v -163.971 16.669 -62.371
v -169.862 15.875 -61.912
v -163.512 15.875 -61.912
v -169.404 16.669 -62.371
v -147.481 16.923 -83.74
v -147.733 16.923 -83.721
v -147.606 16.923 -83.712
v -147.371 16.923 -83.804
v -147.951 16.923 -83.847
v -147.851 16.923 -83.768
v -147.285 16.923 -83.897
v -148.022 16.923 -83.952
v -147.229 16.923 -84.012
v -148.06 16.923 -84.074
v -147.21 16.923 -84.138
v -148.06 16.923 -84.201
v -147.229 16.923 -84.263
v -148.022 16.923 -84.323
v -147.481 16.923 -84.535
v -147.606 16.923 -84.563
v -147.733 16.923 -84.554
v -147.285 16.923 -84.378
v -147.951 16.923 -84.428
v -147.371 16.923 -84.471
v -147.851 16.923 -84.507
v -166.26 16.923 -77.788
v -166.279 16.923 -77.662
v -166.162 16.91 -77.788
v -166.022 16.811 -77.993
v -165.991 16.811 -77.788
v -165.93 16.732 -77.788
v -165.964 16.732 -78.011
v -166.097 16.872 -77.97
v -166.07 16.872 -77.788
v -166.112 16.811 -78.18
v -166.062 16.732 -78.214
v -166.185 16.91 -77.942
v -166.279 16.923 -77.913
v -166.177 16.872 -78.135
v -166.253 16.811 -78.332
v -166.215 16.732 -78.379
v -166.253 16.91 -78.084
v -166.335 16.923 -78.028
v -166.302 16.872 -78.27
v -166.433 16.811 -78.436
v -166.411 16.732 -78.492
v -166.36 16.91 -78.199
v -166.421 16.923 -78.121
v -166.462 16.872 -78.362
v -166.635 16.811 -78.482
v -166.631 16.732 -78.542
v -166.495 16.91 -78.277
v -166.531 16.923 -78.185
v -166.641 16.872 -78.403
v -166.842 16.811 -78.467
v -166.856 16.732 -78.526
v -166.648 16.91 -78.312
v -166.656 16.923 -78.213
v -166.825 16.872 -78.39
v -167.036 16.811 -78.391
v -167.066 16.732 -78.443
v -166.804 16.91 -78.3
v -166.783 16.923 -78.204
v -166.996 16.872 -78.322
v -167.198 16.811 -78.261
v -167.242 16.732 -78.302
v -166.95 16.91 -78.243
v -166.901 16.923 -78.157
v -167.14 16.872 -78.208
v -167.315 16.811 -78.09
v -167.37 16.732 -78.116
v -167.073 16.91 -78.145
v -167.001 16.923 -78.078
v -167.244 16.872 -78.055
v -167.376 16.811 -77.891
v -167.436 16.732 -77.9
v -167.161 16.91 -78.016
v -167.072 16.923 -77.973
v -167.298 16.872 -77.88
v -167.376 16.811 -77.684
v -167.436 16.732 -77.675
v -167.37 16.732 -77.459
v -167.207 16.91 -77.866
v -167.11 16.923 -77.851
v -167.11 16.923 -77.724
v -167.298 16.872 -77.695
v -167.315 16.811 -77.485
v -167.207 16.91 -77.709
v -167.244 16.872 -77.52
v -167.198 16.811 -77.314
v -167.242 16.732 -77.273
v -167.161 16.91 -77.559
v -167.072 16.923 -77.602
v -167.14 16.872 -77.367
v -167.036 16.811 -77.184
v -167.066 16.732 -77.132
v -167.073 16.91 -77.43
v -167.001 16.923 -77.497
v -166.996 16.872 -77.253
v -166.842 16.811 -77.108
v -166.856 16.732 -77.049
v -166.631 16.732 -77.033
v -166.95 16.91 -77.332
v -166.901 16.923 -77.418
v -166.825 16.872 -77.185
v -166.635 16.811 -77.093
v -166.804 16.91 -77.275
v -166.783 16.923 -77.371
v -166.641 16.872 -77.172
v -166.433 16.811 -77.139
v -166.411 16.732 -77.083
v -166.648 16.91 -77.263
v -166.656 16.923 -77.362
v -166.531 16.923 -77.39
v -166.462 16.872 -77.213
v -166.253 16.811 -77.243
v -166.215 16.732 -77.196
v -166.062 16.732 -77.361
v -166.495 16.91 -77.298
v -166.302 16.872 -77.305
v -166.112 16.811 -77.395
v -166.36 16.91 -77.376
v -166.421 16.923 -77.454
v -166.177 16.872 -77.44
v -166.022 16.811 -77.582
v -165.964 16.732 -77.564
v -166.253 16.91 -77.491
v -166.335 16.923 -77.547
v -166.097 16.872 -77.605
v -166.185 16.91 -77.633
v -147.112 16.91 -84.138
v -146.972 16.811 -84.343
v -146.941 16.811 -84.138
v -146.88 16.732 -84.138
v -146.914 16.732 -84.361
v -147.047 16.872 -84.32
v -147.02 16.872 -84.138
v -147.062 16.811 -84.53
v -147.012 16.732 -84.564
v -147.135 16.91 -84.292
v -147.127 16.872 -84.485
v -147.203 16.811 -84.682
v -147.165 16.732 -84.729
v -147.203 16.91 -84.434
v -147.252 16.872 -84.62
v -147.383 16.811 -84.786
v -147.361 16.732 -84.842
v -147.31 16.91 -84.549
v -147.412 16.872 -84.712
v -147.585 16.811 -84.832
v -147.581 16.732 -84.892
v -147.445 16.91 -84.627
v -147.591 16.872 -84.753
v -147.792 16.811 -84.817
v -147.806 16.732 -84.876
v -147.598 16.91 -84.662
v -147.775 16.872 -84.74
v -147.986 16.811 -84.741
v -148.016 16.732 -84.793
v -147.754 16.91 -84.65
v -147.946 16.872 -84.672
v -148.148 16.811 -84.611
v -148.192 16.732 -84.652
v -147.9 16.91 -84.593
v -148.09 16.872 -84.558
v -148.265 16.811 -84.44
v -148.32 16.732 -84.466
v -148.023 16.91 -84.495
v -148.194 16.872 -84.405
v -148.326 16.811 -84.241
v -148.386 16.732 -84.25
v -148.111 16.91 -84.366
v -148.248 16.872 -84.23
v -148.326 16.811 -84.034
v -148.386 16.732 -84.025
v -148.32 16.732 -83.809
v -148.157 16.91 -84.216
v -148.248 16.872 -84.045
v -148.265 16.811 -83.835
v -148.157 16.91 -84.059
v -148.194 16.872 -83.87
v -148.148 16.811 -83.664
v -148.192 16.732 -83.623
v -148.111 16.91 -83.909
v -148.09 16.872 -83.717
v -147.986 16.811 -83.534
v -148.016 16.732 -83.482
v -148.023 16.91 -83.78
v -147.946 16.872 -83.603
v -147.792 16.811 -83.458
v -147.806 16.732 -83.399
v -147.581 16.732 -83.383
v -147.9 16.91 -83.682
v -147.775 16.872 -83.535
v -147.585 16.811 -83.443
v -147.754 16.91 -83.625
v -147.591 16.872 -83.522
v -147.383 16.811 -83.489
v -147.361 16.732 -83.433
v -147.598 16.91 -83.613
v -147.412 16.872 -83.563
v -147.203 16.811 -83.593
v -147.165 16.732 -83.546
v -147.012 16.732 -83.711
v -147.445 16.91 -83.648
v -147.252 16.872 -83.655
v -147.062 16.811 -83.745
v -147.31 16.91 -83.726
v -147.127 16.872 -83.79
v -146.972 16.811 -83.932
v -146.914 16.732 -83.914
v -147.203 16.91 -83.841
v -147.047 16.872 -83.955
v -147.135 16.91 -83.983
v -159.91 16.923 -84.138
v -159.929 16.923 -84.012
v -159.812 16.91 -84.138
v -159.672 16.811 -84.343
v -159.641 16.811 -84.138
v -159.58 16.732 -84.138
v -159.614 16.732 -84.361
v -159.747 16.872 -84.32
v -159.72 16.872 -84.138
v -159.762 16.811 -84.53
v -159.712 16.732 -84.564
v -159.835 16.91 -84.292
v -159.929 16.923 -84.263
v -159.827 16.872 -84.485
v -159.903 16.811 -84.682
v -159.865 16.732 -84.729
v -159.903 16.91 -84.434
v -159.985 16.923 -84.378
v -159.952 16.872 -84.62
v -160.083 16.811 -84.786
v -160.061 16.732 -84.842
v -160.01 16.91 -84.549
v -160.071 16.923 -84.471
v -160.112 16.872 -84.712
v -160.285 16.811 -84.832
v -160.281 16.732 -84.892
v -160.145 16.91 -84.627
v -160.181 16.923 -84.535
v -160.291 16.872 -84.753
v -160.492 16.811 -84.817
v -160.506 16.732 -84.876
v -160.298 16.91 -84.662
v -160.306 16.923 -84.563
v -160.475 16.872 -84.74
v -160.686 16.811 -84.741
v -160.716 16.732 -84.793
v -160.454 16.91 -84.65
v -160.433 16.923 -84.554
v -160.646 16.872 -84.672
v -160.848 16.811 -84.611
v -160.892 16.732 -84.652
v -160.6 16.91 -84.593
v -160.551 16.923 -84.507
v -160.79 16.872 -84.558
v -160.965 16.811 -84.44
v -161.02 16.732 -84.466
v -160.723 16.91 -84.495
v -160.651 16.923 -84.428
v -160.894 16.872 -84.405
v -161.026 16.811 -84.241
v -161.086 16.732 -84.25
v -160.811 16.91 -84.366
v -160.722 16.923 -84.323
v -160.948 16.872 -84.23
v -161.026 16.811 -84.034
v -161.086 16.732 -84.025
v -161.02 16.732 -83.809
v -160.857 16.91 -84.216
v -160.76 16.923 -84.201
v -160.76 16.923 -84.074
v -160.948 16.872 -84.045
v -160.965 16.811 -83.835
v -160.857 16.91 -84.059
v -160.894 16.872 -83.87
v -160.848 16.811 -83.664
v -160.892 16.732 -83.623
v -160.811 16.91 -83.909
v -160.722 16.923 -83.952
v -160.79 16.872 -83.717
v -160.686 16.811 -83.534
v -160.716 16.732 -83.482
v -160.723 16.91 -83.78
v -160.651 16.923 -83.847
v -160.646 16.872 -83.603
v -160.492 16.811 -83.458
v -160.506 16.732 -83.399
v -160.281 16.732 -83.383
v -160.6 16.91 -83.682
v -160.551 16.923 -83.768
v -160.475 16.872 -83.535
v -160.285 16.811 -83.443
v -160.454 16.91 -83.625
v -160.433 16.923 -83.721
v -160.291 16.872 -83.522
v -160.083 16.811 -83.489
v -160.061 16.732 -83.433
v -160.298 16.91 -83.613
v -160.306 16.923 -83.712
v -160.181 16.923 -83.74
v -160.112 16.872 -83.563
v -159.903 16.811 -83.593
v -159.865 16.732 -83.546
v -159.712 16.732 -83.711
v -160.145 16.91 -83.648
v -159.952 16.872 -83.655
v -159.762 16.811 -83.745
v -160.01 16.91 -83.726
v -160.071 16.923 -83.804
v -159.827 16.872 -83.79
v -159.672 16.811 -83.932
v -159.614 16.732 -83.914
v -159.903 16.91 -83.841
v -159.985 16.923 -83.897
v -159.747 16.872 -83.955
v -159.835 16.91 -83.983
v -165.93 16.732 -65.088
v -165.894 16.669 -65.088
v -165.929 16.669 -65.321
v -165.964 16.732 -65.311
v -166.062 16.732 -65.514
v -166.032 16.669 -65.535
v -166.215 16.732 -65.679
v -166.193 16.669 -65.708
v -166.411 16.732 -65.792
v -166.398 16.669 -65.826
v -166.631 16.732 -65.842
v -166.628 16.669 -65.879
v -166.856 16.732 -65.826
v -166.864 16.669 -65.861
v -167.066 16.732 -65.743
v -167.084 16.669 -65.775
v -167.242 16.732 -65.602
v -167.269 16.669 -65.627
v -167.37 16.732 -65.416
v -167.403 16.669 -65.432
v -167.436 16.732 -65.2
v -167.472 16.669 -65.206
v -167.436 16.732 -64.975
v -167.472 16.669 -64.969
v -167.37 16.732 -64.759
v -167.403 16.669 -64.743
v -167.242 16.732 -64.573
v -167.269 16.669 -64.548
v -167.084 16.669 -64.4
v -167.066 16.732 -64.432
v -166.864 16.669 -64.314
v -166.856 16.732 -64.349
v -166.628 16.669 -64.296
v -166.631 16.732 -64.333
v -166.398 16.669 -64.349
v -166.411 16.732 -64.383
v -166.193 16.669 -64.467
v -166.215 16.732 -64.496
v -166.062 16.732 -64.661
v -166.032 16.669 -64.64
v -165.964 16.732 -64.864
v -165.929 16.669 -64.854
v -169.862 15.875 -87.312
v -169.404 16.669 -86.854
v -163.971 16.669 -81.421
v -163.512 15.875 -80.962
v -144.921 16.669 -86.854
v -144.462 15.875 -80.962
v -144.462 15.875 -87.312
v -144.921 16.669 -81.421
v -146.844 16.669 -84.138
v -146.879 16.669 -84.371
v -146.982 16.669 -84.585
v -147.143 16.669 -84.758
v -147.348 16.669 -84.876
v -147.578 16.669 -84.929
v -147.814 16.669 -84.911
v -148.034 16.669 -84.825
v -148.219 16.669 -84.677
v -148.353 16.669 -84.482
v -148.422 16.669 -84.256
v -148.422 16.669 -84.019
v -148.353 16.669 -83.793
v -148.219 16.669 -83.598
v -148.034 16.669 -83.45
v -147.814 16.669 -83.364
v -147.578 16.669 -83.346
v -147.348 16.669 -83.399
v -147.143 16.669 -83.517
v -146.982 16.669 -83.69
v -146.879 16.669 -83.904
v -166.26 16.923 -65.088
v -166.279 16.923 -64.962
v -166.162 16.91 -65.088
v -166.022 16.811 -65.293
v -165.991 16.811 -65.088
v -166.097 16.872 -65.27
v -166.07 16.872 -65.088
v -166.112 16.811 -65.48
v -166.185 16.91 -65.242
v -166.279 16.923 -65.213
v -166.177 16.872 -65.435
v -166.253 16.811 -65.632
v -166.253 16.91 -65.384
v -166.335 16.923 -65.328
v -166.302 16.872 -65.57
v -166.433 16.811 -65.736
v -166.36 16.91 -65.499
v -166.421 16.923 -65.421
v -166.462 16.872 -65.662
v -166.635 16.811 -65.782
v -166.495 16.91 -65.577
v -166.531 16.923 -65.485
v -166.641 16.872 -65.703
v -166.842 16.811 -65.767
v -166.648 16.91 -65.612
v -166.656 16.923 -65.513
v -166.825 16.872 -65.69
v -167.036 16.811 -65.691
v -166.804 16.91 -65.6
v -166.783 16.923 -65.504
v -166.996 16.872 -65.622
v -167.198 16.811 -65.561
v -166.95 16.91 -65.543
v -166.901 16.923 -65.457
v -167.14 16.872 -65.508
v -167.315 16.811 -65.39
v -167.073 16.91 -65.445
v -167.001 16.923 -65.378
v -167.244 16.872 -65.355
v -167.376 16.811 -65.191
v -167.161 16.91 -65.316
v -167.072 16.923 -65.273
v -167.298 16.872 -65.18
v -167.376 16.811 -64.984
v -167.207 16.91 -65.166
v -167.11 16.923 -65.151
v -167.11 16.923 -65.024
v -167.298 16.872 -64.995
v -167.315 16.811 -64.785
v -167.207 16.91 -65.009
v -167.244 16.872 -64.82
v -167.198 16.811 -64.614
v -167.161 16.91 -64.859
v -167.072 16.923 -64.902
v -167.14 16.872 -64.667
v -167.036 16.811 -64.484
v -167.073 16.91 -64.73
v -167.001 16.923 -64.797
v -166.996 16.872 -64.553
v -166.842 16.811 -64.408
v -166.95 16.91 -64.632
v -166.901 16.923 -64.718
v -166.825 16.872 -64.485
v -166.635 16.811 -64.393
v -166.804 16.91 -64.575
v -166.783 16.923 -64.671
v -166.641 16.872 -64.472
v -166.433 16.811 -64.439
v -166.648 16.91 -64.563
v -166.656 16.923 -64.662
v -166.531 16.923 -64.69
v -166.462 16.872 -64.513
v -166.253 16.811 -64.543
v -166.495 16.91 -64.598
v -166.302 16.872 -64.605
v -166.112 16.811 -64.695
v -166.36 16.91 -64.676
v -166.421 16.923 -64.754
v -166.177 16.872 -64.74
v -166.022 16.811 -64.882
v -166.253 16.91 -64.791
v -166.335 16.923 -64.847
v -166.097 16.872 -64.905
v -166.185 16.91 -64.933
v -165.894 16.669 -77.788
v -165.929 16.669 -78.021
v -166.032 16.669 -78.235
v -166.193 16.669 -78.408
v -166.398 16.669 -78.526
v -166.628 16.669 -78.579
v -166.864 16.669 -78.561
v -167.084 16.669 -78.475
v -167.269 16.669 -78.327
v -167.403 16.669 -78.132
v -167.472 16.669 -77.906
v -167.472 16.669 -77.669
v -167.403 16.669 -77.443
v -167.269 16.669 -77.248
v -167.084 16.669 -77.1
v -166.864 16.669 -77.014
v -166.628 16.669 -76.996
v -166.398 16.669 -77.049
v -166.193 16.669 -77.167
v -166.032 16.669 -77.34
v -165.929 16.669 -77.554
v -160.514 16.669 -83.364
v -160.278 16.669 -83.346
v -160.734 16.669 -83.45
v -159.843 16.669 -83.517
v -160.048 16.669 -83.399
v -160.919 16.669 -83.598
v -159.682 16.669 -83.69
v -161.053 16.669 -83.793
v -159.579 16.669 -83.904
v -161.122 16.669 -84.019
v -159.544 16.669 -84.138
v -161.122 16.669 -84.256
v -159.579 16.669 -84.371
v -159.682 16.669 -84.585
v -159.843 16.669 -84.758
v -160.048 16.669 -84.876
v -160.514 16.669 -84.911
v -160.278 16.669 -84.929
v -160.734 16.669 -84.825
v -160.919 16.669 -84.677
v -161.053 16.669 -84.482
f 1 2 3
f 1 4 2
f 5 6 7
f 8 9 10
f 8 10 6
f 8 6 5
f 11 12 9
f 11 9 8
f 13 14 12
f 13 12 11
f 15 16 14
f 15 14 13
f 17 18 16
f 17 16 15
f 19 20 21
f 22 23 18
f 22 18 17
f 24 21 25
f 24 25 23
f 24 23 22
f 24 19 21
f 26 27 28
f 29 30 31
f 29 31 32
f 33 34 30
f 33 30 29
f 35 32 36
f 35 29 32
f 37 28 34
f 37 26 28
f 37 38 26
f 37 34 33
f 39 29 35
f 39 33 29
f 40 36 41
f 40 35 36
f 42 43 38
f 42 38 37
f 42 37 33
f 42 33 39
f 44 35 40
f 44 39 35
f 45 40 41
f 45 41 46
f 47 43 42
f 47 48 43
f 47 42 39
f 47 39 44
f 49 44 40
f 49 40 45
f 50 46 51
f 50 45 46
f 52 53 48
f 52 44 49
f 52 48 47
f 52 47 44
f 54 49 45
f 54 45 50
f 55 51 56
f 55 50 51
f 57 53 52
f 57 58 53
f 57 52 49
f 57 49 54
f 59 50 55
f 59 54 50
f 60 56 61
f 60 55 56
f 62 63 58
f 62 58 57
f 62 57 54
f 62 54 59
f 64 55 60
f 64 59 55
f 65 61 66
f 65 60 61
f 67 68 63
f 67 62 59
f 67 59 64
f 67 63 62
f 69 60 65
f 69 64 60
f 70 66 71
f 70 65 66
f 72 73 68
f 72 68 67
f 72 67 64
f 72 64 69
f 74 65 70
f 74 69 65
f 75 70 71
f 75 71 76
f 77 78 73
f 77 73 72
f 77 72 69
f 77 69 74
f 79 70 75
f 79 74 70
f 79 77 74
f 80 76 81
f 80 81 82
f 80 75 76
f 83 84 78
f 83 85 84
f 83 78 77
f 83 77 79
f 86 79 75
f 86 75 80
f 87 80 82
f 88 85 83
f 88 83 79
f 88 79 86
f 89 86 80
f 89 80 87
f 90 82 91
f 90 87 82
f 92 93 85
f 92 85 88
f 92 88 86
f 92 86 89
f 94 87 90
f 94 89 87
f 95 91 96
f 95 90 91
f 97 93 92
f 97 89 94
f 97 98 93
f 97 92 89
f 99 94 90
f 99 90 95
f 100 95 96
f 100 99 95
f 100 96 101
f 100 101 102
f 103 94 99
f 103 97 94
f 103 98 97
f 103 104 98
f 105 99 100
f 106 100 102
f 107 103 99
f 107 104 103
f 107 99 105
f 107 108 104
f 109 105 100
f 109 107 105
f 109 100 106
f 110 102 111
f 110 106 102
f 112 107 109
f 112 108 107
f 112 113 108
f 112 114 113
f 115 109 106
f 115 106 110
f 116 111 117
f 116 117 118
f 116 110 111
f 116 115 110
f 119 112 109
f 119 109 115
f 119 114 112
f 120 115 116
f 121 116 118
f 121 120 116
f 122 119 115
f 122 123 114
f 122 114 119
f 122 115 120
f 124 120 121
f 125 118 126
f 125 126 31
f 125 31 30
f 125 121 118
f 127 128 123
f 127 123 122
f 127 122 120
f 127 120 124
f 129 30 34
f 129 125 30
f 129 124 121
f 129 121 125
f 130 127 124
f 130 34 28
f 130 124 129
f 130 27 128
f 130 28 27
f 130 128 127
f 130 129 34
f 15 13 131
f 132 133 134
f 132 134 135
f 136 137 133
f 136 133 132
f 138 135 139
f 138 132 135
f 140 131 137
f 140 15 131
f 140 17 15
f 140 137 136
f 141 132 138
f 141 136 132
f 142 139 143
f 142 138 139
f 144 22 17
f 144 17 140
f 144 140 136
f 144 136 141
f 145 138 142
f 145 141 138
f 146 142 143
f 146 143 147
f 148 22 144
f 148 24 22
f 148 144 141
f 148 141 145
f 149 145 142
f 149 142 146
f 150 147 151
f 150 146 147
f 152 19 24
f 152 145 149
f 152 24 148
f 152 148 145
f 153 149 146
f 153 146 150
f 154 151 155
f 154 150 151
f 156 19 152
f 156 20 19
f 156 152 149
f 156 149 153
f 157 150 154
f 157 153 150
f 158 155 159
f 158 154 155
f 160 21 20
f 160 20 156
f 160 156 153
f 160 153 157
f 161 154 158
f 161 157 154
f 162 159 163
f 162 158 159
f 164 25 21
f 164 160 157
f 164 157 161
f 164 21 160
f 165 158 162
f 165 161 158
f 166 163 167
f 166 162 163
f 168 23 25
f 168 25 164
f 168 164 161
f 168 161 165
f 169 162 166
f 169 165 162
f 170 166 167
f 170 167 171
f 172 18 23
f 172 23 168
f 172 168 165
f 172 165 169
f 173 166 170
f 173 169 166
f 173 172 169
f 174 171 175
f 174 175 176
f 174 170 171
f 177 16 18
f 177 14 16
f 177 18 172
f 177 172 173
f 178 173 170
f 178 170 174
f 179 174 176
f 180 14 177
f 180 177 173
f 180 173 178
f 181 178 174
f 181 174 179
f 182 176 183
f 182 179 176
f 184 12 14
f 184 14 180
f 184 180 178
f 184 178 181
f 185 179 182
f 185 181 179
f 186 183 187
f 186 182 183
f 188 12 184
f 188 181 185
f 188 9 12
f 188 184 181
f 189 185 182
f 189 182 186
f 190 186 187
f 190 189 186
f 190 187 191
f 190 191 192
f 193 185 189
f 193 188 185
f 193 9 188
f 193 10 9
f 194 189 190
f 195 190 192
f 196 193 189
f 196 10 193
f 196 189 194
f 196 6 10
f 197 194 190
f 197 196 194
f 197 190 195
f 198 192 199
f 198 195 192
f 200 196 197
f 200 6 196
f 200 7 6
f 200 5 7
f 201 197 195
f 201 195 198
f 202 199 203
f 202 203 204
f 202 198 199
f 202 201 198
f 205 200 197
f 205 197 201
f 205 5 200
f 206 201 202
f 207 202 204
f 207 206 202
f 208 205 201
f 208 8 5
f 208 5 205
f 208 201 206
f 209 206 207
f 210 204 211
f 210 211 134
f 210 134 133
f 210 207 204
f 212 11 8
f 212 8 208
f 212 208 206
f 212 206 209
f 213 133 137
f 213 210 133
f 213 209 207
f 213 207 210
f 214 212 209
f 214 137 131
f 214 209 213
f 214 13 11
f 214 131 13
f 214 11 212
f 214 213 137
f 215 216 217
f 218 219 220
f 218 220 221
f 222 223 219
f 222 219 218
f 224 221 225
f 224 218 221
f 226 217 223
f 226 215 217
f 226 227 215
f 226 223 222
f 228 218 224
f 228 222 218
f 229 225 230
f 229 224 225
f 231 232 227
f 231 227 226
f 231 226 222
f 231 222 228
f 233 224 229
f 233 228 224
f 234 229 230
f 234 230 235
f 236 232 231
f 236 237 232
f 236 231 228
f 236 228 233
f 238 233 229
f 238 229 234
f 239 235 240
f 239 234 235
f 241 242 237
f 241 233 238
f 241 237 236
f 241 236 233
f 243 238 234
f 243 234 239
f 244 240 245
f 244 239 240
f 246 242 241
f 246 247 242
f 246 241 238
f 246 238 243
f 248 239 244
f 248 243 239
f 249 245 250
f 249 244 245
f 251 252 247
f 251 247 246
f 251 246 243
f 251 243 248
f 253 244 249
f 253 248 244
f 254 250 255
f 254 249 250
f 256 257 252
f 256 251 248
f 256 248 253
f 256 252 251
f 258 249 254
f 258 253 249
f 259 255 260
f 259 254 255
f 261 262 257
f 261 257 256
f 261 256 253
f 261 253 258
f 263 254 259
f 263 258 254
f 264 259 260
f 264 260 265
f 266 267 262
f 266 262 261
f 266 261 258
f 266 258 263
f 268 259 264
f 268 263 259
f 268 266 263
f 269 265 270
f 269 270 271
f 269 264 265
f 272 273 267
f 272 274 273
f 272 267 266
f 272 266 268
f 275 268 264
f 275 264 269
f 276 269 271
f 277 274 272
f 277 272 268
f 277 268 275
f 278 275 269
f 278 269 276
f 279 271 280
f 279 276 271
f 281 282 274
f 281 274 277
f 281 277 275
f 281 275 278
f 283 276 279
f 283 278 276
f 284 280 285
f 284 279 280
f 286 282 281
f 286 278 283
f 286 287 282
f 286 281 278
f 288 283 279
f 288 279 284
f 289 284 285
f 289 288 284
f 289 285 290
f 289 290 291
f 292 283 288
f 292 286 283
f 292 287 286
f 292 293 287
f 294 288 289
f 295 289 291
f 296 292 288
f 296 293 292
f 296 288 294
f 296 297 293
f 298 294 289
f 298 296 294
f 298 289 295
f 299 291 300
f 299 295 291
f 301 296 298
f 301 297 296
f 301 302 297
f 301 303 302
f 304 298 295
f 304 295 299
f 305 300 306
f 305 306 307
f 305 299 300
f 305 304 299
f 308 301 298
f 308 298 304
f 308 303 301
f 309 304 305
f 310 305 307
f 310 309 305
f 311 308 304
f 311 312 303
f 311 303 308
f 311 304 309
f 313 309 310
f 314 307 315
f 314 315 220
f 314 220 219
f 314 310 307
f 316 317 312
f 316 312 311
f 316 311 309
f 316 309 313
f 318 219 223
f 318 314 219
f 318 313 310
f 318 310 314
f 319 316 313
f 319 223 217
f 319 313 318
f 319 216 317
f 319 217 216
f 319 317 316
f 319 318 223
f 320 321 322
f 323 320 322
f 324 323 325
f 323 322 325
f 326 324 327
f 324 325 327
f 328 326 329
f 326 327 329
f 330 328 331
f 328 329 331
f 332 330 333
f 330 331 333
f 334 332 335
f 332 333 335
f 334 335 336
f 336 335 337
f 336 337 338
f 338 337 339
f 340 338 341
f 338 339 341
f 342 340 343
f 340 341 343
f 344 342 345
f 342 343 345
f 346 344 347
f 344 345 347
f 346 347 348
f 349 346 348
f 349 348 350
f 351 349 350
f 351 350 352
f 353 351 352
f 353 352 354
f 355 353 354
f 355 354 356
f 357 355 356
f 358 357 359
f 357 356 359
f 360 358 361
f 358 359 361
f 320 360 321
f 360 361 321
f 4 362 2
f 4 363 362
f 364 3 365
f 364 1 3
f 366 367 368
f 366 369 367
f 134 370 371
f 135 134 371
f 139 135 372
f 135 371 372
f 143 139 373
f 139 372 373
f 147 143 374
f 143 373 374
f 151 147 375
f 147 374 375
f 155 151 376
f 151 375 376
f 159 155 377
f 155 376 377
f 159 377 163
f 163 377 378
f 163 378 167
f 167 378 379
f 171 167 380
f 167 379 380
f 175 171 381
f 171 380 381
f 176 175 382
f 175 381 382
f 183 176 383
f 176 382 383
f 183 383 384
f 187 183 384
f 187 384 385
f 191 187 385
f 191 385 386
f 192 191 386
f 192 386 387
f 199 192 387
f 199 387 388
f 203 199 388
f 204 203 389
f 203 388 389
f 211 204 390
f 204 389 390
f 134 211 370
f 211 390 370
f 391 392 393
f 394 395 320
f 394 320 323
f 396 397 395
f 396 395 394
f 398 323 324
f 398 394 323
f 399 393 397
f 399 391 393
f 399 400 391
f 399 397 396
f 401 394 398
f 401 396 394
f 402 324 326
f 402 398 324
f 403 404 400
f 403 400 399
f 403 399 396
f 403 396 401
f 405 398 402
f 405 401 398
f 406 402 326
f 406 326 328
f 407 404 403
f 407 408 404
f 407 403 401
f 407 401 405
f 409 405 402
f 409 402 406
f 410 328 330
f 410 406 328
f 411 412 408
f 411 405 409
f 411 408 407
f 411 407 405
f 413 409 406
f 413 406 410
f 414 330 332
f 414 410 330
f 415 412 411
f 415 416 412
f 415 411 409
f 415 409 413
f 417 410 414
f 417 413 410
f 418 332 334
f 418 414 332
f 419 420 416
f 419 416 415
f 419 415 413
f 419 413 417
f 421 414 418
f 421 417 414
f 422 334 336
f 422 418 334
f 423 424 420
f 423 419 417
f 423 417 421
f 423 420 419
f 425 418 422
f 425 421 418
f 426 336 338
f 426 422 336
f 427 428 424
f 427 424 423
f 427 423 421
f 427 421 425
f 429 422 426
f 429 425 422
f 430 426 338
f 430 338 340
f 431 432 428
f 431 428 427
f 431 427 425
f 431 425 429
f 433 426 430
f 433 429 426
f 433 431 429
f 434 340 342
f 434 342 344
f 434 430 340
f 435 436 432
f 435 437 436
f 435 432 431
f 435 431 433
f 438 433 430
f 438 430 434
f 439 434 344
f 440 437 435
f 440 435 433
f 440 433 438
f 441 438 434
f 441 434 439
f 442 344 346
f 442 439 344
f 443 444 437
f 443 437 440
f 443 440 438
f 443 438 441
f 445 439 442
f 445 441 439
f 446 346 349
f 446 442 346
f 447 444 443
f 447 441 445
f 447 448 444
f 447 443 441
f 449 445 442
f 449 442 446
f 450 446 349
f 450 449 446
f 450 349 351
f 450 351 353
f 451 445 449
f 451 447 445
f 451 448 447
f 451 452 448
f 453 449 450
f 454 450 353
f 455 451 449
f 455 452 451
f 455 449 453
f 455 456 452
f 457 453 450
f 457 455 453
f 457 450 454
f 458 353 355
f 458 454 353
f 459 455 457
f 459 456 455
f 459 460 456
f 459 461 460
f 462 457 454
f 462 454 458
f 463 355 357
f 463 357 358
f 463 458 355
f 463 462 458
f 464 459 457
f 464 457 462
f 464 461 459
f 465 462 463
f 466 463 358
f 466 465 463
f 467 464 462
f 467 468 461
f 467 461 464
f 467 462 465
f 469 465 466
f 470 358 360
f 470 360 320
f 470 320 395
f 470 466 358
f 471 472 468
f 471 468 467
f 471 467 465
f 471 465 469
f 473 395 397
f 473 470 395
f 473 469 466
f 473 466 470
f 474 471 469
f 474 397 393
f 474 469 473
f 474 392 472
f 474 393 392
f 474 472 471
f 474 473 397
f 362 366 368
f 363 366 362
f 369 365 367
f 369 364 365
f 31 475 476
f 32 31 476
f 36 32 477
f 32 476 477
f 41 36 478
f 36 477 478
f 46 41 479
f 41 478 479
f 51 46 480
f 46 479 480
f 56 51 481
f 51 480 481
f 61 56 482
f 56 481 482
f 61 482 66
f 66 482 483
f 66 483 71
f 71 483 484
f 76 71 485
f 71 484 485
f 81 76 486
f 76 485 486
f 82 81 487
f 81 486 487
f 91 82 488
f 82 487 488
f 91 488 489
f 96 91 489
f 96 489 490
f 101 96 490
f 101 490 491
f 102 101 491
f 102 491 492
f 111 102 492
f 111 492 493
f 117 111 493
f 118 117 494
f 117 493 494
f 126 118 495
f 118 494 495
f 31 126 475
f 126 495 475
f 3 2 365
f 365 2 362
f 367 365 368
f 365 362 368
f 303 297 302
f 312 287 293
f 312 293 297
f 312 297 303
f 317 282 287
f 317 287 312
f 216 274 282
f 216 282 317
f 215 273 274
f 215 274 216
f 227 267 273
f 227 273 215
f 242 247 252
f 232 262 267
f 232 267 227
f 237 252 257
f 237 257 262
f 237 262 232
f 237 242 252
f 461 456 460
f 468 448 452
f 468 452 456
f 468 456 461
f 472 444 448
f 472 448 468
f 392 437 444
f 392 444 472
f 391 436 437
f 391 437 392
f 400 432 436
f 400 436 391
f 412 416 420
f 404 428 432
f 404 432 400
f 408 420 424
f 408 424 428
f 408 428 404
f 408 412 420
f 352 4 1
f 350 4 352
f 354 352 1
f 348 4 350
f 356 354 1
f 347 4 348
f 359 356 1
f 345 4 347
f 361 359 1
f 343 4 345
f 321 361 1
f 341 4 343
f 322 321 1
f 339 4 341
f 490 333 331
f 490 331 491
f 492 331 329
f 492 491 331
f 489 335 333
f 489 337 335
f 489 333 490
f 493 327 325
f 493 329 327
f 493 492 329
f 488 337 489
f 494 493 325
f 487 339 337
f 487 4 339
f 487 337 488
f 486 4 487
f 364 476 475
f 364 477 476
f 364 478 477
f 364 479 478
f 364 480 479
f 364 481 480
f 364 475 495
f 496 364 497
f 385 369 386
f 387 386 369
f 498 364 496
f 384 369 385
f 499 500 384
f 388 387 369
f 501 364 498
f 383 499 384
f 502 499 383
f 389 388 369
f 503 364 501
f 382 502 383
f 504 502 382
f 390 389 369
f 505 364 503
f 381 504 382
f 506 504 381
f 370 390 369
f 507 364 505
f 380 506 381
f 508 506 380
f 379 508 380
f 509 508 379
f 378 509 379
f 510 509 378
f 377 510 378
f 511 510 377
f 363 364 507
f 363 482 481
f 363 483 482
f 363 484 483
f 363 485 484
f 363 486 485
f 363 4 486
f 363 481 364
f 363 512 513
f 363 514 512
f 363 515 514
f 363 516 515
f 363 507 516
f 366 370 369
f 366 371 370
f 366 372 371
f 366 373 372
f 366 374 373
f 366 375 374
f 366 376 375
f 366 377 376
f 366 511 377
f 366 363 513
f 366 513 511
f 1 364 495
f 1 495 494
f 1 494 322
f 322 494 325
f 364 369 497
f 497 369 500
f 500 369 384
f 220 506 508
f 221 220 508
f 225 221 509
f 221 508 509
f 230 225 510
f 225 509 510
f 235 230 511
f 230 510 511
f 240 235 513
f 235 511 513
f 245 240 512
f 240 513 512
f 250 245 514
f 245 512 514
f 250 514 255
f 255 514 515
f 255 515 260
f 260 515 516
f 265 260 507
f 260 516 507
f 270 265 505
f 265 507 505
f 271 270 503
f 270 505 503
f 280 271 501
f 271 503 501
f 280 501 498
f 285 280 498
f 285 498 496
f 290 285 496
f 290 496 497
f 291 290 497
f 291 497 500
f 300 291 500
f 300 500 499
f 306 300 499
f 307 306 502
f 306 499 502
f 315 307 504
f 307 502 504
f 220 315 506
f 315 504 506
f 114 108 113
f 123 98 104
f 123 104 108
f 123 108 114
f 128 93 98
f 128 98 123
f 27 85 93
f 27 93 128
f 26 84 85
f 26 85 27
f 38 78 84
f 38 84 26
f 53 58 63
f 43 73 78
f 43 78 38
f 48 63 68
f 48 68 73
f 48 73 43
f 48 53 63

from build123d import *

# Parameters (mm, degrees)
BOSS_EXTRUDE1_DEPTH           = 0.79375
BOSS_EXTRUDE1_TAPER           = 30
SKETCH3_R                     = 0.79375
BOSS_EXTRUDE2_DEPTH           = 0.254
BOSS_EXTRUDE2_DRAFT           = 30
BOSS_EXTRUDE2_PROFILE_2_DEPTH = 0.254
BOSS_EXTRUDE2_PROFILE_2_DRAFT = 30
BOSS_EXTRUDE2_PROFILE_3_DEPTH = 0.254
BOSS_EXTRUDE2_PROFILE_3_DRAFT = 30
BOSS_EXTRUDE2_PROFILE_4_DEPTH = 0.254
BOSS_EXTRUDE2_PROFILE_4_DRAFT = 30
FILLET1_R                     = 0.381


with BuildPart() as part:
    # Sketch2 → Boss-Extrude1 (new body)
    with BuildSketch(Plane(origin=(0, 15.875, 0), x_dir=(1, 0, 0), z_dir=(0, 1, 0))):
        Polygon((-169.8625, 61.9125), (-163.5125, 61.9125), (-163.5125, 80.9625), (-144.4625, 80.9625), (-144.4625, 87.3125), (-169.8625, 87.3125), align=None)
    extrude(amount=BOSS_EXTRUDE1_DEPTH, taper=BOSS_EXTRUDE1_TAPER)


with BuildPart() as boss_extrude2_tool:
    # Sketch3 → Boss-Extrude2 (with draft: the straight prism first)
    with BuildSketch(Plane(origin=(0, 16.66875, 0), x_dir=(1, 0, 0), z_dir=(0, 1, 0))):
        with Locations((-166.6875, 65.0875)):
            Circle(SKETCH3_R)
    extrude(amount=BOSS_EXTRUDE2_DEPTH)
    # Boss-Extrude2: the draft: its side faces are tilted about the plane it starts from
    boss_extrude2_sides = [boss_extrude2_tool.faces().sort_by_distance(p)[0] for p in [
        (-167.48125, 16.79575, -65.0875),
    ]]
    draft(boss_extrude2_sides, Plane(origin=(0, 16.66875, 0), x_dir=(1, 0, 0), z_dir=(0, 1, 0)), BOSS_EXTRUDE2_DRAFT)


with BuildPart() as part_1:
    add(part.part)

    # Boss-Extrude2: add boss_extrude2_tool
    add(boss_extrude2_tool.part)


with BuildPart() as boss_extrude2_profile_2_tool:
    # Sketch3 → Boss-Extrude2 profile 2 (with draft: the straight prism first)
    with BuildSketch(Plane(origin=(0, 16.66875, 0), x_dir=(1, 0, 0), z_dir=(0, 1, 0))):
        with Locations((-166.6875, 77.7875)):
            Circle(SKETCH3_R)
    extrude(amount=BOSS_EXTRUDE2_PROFILE_2_DEPTH)
    # Boss-Extrude2 profile 2: the draft: its side faces are tilted about the plane it starts from
    boss_extrude2_profile_2_sides = [boss_extrude2_profile_2_tool.faces().sort_by_distance(p)[0] for p in [
        (-167.48125, 16.79575, -77.7875),
    ]]
    draft(boss_extrude2_profile_2_sides, Plane(origin=(0, 16.66875, 0), x_dir=(1, 0, 0), z_dir=(0, 1, 0)), BOSS_EXTRUDE2_PROFILE_2_DRAFT)


with BuildPart() as part_2:
    add(part_1.part)

    # Boss-Extrude2 profile 2: add boss_extrude2_profile_2_tool
    add(boss_extrude2_profile_2_tool.part)


with BuildPart() as boss_extrude2_profile_3_tool:
    # Sketch3 → Boss-Extrude2 profile 3 (with draft: the straight prism first)
    with BuildSketch(Plane(origin=(0, 16.66875, 0), x_dir=(1, 0, 0), z_dir=(0, 1, 0))):
        with Locations((-160.3375, 84.1375)):
            Circle(SKETCH3_R)
    extrude(amount=BOSS_EXTRUDE2_PROFILE_3_DEPTH)
    # Boss-Extrude2 profile 3: the draft: its side faces are tilted about the plane it starts from
    boss_extrude2_profile_3_sides = [boss_extrude2_profile_3_tool.faces().sort_by_distance(p)[0] for p in [
        (-161.13125, 16.79575, -84.1375),
    ]]
    draft(boss_extrude2_profile_3_sides, Plane(origin=(0, 16.66875, 0), x_dir=(1, 0, 0), z_dir=(0, 1, 0)), BOSS_EXTRUDE2_PROFILE_3_DRAFT)


with BuildPart() as part_3:
    add(part_2.part)

    # Boss-Extrude2 profile 3: add boss_extrude2_profile_3_tool
    add(boss_extrude2_profile_3_tool.part)


with BuildPart() as boss_extrude2_profile_4_tool:
    # Sketch3 → Boss-Extrude2 profile 4 (with draft: the straight prism first)
    with BuildSketch(Plane(origin=(0, 16.66875, 0), x_dir=(1, 0, 0), z_dir=(0, 1, 0))):
        with Locations((-147.6375, 84.1375)):
            Circle(SKETCH3_R)
    extrude(amount=BOSS_EXTRUDE2_PROFILE_4_DEPTH)
    # Boss-Extrude2 profile 4: the draft: its side faces are tilted about the plane it starts from
    boss_extrude2_profile_4_sides = [boss_extrude2_profile_4_tool.faces().sort_by_distance(p)[0] for p in [
        (-148.43125, 16.79575, -84.1375),
    ]]
    draft(boss_extrude2_profile_4_sides, Plane(origin=(0, 16.66875, 0), x_dir=(1, 0, 0), z_dir=(0, 1, 0)), BOSS_EXTRUDE2_PROFILE_4_DRAFT)


with BuildPart() as part_4:
    add(part_3.part)

    # Boss-Extrude2 profile 4: add boss_extrude2_profile_4_tool
    add(boss_extrude2_profile_4_tool.part)

    # Fillet1
    fillet1_edges = [part_4.edges().sort_by_distance(p)[0] for p in [
        (-167.334603032, 16.92275, -65.0875),
        (-167.334603032, 16.92275, -77.7875),
        (-160.984603032, 16.92275, -84.1375),
        (-148.284603032, 16.92275, -84.1375),
    ]]
    fillet(fillet1_edges, radius=FILLET1_R)


solid = part_4.part
